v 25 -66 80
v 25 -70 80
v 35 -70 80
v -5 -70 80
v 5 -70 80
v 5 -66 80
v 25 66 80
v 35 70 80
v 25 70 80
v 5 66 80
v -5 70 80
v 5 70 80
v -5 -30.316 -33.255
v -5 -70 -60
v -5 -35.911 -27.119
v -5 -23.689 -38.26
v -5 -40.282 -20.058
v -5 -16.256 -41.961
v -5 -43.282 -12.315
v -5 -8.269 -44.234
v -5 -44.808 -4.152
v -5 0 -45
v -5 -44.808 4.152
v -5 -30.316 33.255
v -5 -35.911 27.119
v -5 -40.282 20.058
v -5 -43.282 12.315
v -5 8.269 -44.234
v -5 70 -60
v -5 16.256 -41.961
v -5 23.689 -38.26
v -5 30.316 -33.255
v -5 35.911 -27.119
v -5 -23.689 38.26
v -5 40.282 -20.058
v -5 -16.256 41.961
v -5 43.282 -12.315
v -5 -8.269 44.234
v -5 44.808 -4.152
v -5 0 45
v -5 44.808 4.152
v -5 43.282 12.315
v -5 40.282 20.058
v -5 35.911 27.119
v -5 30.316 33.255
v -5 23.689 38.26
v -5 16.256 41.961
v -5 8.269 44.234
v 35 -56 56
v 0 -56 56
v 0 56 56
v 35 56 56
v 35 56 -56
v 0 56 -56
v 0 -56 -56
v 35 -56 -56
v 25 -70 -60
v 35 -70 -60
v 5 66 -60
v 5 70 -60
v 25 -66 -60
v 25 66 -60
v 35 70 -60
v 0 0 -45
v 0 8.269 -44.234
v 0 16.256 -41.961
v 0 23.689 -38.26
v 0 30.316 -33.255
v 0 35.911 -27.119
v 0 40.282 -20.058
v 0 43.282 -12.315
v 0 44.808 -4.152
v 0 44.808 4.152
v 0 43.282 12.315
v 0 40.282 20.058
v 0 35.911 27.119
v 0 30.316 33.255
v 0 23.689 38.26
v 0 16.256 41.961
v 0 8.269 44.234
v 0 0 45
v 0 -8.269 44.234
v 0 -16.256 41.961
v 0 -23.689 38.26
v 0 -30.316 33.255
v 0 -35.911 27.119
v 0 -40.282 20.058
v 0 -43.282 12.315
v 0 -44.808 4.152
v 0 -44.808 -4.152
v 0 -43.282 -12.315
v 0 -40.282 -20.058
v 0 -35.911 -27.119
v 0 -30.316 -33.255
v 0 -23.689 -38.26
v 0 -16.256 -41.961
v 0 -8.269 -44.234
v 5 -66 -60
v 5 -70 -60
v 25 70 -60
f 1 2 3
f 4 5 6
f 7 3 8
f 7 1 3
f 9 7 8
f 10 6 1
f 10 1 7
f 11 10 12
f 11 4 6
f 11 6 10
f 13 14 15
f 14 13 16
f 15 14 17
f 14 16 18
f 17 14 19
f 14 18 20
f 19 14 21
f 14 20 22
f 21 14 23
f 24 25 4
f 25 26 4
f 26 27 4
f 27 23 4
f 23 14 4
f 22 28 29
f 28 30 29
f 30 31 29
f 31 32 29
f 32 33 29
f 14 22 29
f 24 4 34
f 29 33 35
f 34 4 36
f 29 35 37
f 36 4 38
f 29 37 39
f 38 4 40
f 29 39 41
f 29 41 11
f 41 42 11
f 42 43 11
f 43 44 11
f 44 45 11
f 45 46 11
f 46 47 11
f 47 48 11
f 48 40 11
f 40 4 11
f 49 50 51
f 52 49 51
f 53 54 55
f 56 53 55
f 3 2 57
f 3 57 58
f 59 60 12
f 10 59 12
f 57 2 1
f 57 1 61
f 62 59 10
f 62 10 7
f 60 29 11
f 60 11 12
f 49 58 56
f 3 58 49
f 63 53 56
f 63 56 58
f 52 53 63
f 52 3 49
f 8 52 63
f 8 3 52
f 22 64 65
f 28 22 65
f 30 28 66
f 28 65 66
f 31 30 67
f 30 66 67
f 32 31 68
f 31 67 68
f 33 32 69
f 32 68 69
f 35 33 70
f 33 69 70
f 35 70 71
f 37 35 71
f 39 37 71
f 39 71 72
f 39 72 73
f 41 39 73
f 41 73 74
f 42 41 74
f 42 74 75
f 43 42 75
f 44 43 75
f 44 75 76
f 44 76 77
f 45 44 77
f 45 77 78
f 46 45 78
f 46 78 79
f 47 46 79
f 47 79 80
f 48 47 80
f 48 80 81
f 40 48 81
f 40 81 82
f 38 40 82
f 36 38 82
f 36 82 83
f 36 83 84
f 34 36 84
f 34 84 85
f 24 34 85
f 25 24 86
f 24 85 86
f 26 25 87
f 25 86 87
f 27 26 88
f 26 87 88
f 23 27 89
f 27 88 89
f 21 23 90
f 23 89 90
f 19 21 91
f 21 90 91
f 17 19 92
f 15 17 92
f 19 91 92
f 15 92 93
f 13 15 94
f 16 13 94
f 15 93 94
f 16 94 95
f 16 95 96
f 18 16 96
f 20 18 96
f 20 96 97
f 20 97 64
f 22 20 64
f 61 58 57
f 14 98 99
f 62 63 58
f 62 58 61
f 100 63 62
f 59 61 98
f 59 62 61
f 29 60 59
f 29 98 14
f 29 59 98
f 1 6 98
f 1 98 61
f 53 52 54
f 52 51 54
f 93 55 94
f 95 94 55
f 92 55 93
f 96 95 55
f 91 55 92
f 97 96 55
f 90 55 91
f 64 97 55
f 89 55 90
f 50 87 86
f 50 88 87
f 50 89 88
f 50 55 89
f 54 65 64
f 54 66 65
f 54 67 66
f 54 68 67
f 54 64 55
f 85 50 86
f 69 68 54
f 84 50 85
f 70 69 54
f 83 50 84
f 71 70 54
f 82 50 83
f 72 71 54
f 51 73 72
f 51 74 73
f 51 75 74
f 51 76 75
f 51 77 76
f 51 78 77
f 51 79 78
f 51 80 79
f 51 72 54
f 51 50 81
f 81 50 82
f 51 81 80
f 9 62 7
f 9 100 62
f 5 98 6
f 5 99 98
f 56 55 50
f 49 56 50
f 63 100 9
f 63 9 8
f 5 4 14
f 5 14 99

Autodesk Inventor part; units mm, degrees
ref_plane "YZ Plane" through (0, 0, 0) normal (1, 0, 0) x (0, 1, 0)
ref_plane "XZ Plane" through (0, 0, 0) normal (0, 1, 0) x (-1, 0, 0)
ref_plane "XY Plane" through (0, 0, 0) normal (0, 0, 1) x (1, 0, 0)
sketch "Sketch1" plane through (0, 0, 0) normal (1, 0, 0) x (0, 1, 0)
  line L0 (-56, 56) -> (56, 56)
  line L1 (56, 56) -> (56, -56)
  line L2 (56, -56) -> (-56, -56)
  line L3 (-56, -56) -> (-56, 56)
  line L4 (-56, 56) -> (56, -56) construction
  line L5 (56, 56) -> (-56, -56) construction
  line L6 (-80, 80) -> (80, 80)
  line L7 (80, 80) -> (80, -80)
  line L8 (80, -80) -> (-80, -80)
  line L9 (-80, -80) -> (-80, 80)
  line L10 (-80, 80) -> (80, -80) construction
  line L11 (80, 80) -> (-80, -80) construction
  point P0 (0, 0)
  dimension "d0" = 112
  dimension "d1" = 112
  dimension "d2" = 160
  dimension "d3" = 160
extrude "Extrusion1" add sketch "Sketch1" along normal blind 35
extrude "Extrusion2" add sketch "Sketch1" against normal blind 5 contours L0 L1 L2 L3 | L6 L7 L8 L9
sketch "Sketch2" plane through (0, 0, 0) normal (1, 0, 0) x (0, 0, -1)
  circle A0 centre (0, 0) radius 45
  dimension "d8" = 90
extrude "Extrusion3" cut sketch "Sketch2" against normal through all
sketch "Sketch3" plane through (35, -80, 80) normal (0, 0, 1) x (1, 0, 0)
  line L0 (-35, 136) -> (-35, 24) projected
  line L1 (-35, 24) -> (0, 24) projected
  line L2 (-35, 136) -> (0, 136) projected
  line L3 (0, 0) -> (-40, 0) projected
  line L4 (-30, 0) -> (-30, 10)
  line L5 (-30, 10) -> (-10, 10)
  line L6 (-10, 10) -> (-10, 0)
  line L7 (0, 160) -> (0, 0) projected
  line L8 (-40, 0) -> (0, 0) projected
  line L9 (0, 160) -> (0, 0) projected
  line L10 (0, 160) -> (-40, 160) projected
  line L11 (-40, 0) -> (-40, 160) projected
  line L12 (-17.5, 80) -> (-40, 80)
  line L13 (-30, 0) -> (-10, 0)
  line L14 (-30, 160) -> (-30, 150)
  line L15 (-30, 150) -> (-10, 150)
  line L16 (-10, 150) -> (-10, 160)
  line L17 (-30, 160) -> (-10, 160)
  point P0 (-35, 80)
  dimension "d11" = 20
  dimension "d12" = 10
  dimension "d13" = 10
extrude "Extrusion4" cut sketch "Sketch3" against normal through all contours L16 L15 L14 L10 | L4 L5 L6 L3
sketch "Sketch4" plane through (35, -80, -80) normal (0, 0, -1) x (-1, 0, 0)
  line L0 (0, 0) -> (0, 160) projected
  line L1 (40, 160) -> (40, 0) projected
  line L2 (0, 0) -> (40, 0)
  line L3 (40, 0) -> (40, 160)
  line L4 (40, 160) -> (0, 160)
  line L5 (0, 160) -> (0, 0)
  point P0 (35, 80)
extrude "Extrusion5" cut sketch "Sketch4" against normal blind 20
sketch "Sketch5" plane through (25, -80, 80) normal (0, -1, 0) x (1, 0, 0)
  line L0 (-30, -140) -> (-30, 0) projected
  line L1 (-30, 0) -> (10, 0)
  line L2 (10, 0) -> (10, -140)
  line L3 (10, -140) -> (-30, -140)
  line L4 (-30, -140) -> (-30, 0)
  point P0 (-25, -80)
extrude "Extrusion6" cut sketch "Sketch5" against normal blind 10
sketch "Sketch6" plane through (25, 80, 80) normal (0, 1, 0) x (1, 0, 0)
  line L0 (10, 0) -> (0, 0) projected
  line L1 (-30, 0) -> (-30, 140) projected
  line L2 (10, 0) -> (-30, 0)
  line L3 (-30, 0) -> (-30, 140)
  line L4 (-30, 140) -> (10, 140)
  line L5 (10, 140) -> (10, 0)
  point P0 (-25, 80)
extrude "Extrusion7" cut sketch "Sketch6" against normal blind 10
sketch "Sketch7" plane through (-5, -70, 80) normal (0, -1, 0) x (1, 0, 0)
  line L0 (40, 0) -> (0, 0) projected
  line L1 (40, -140) -> (0, -140) projected
  line L2 (10, 0) -> (30, 0)
  line L3 (30, 0) -> (30, -140)
  line L4 (30, -140) -> (10, -140)
  line L5 (10, -140) -> (10, 0)
  point P0 (5, -80)
  dimension "d22" = 20
extrude "Extrusion8" cut sketch "Sketch7" against normal blind 4
sketch "Sketch8" plane through (-5, 70, 80) normal (0, 1, 0) x (1, 0, 0)
  line L0 (30, 0) -> (40, 0) projected
  line L1 (10, 140) -> (10, 0) projected
  line L2 (30, 0) -> (10, 0)
  line L3 (10, 0) -> (10, 140)
  line L4 (10, 140) -> (30, 140)
  line L5 (30, 140) -> (30, 0)
  point P0 (5, 80)
extrude "Extrusion9" cut sketch "Sketch8" against normal blind 4
properties part number "LeadScrewBox"
